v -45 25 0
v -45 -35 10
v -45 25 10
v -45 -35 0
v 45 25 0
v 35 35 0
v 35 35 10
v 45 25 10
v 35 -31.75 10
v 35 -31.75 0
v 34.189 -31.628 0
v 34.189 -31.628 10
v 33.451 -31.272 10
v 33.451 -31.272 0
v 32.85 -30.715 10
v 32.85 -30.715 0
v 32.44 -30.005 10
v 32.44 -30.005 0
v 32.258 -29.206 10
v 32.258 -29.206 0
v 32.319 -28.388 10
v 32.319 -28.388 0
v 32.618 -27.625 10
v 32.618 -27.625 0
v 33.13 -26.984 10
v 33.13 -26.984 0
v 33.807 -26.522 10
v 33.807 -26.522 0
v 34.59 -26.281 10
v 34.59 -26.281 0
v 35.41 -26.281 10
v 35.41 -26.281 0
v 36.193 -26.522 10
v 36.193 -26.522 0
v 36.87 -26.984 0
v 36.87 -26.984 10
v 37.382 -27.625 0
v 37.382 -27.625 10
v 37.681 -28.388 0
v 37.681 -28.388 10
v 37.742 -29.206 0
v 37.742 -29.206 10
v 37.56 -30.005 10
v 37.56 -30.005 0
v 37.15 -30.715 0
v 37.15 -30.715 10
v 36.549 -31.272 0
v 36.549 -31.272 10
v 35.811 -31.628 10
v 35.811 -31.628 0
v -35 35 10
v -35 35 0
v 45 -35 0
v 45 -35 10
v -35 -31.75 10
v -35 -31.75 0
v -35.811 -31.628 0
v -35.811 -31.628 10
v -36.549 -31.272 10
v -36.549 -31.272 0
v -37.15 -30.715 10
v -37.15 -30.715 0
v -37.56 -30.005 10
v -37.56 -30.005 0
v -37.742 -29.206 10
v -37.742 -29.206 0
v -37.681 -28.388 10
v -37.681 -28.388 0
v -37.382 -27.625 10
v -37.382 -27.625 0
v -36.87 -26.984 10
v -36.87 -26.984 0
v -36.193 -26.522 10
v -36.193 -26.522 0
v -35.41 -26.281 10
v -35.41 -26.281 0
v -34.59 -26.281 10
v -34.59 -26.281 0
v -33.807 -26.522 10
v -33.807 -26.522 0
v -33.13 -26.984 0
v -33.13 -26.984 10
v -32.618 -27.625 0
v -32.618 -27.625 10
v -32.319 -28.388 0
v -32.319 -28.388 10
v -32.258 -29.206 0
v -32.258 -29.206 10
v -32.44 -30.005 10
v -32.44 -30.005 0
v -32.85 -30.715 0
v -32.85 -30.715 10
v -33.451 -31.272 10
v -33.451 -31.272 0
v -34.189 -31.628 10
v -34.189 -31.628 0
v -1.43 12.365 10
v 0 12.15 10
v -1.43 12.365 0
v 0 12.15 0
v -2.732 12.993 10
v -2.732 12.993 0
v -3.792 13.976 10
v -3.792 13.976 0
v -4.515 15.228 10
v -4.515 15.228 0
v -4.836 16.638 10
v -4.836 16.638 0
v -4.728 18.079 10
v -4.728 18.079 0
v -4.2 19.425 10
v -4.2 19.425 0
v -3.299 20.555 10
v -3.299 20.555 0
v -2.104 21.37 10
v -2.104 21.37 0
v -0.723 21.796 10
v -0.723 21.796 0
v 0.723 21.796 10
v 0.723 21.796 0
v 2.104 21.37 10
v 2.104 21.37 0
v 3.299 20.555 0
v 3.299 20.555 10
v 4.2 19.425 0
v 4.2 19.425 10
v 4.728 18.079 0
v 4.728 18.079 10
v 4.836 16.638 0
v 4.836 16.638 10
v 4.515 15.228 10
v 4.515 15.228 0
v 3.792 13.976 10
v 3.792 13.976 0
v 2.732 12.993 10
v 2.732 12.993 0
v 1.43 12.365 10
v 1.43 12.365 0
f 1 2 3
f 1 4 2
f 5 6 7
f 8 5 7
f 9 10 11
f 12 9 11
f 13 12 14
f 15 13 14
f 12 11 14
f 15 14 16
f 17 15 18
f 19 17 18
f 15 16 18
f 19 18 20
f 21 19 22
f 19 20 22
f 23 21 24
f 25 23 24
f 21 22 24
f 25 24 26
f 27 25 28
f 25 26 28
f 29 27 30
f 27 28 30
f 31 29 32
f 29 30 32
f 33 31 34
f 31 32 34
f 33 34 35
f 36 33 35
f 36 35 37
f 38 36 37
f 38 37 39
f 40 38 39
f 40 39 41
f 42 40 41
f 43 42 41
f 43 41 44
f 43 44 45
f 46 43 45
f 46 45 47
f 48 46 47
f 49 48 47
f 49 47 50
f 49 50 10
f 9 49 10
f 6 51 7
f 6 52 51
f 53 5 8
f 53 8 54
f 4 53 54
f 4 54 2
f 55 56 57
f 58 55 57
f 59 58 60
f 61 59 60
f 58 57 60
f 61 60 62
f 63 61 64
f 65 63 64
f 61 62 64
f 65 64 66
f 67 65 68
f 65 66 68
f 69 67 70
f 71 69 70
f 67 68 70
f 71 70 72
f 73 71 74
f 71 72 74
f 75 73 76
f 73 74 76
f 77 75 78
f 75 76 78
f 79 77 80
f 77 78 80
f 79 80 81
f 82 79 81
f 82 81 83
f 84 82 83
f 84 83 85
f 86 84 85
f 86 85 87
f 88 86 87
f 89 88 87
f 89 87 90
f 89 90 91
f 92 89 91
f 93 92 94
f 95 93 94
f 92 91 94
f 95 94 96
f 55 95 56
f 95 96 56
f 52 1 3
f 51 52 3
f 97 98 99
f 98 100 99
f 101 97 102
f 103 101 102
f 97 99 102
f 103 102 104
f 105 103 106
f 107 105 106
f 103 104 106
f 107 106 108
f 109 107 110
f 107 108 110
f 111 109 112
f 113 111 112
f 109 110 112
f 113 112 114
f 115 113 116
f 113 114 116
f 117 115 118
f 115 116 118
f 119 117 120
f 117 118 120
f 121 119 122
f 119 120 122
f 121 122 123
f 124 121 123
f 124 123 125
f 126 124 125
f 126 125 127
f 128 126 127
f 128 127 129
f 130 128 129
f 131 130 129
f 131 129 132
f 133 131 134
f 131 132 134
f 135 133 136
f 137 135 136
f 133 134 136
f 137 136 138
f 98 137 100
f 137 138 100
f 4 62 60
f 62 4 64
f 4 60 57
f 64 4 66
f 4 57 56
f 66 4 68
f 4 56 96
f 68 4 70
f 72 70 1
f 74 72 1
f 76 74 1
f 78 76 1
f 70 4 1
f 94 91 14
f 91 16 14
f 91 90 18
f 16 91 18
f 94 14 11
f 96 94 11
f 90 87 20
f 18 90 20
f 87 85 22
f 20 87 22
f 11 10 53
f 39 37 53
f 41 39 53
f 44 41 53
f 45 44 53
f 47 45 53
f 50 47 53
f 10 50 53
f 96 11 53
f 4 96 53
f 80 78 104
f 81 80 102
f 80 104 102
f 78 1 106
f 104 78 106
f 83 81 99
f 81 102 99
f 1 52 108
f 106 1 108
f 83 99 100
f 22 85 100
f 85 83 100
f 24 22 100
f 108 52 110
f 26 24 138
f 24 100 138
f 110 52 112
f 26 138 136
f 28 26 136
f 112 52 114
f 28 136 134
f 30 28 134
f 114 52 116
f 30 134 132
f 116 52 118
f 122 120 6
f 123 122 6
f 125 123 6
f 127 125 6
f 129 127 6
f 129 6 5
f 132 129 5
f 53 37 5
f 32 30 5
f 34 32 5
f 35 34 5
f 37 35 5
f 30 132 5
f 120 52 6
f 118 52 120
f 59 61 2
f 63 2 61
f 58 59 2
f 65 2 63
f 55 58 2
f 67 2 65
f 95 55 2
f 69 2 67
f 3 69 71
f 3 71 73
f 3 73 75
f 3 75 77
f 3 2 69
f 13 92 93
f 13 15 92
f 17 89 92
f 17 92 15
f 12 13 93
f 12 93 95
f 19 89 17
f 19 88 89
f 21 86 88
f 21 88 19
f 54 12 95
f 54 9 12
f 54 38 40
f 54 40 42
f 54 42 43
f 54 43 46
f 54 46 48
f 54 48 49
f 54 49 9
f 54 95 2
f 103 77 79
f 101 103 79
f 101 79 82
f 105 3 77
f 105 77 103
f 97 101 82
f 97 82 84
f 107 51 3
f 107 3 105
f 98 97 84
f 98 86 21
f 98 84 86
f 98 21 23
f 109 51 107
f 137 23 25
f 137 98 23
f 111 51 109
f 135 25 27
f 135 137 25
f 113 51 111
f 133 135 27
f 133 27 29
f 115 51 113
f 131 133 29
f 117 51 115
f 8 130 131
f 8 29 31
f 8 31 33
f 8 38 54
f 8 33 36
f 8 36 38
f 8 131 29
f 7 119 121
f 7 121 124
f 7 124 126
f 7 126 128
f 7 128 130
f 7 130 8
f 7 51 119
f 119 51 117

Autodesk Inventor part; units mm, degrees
ref_plane "YZ Plane" through (0, 0, 0) normal (1, 0, 0) x (0, 1, 0)
ref_plane "XZ Plane" through (0, 0, 0) normal (0, 1, 0) x (-1, 0, 0)
ref_plane "XY Plane" through (0, 0, 0) normal (0, 0, 1) x (1, 0, 0)
sketch "Skizze_Grundkörper" plane through (0, 0, 0) normal (0, 0, 1) x (1, 0, 0)
  line L0 (-63, 0) -> (63, 0) projected
  line L1 (0, -49) -> (0, 49) projected
  line L2 (45, -35) -> (-45, -35)
  line L3 (-45, -35) -> (-45, 35)
  line L4 (-45, 35) -> (45, 35)
  line L5 (45, 35) -> (45, -35)
  line L6 (45, -35) -> (-45, 35) construction
  line L7 (-45, -35) -> (45, 35) construction
  point P0 (0, 0)
  dimension "Länge" = 90
  dimension "Höhe" = 70
extrude "Grundkörper" add sketch "Skizze_Grundkörper" along normal blind 10
sketch "Skizze2" plane through (0, 0, 10) normal (0, 0, 1) x (1, 0, 0)
  line L0 (-45, -35) -> (45, -35) projected
  line L1 (45, -35) -> (45, 35) projected
  line L2 (45, 35) -> (-45, 35) projected
  line L3 (-45, 35) -> (-45, -35) projected
  line L4 (-63, 0) -> (63, 0) projected
  line L5 (0, -49) -> (0, 49) projected
  point P0 (0, 0)
  point P1 (0, 17)
  dimension "d4" = 52
hole "Bohrung_9,7_mm" at (0, 17, 10) direction (0, 0, -1) diameter 9.7 end through all
sketch "Skizze3" plane through (0, 0, 10) normal (0, 0, 1) x (1, 0, 0)
  circle A0 centre (0, 17) radius 4.85 projected
  line L0 (-45, -35) -> (45, -35) projected
  line L1 (45, -35) -> (45, 35) projected
  line L2 (45, 35) -> (-45, 35) projected
  line L3 (-45, 35) -> (-45, -35) projected
  line L4 (-63, 0) -> (63, 0) projected
  line L5 (0, -49) -> (0, 49) projected
  point P0 (0, 0)
  point P1 (-35, -29)
  point P2 (35, -29)
  dimension "d12" = 70
  dimension "d13" = 6
hole "Bohrung_5,5_mm" at (-35, -29, 10) at (35, -29, 10) direction (0, 0, -1) diameter 5.5 end through all
chamfer "Fase_10_mm" distance 10 angle 45 2 edges at (-45, 35, 5) (45, 35, 5)
properties part number "Werkstück_C" material "Stahl, unlegiert"
